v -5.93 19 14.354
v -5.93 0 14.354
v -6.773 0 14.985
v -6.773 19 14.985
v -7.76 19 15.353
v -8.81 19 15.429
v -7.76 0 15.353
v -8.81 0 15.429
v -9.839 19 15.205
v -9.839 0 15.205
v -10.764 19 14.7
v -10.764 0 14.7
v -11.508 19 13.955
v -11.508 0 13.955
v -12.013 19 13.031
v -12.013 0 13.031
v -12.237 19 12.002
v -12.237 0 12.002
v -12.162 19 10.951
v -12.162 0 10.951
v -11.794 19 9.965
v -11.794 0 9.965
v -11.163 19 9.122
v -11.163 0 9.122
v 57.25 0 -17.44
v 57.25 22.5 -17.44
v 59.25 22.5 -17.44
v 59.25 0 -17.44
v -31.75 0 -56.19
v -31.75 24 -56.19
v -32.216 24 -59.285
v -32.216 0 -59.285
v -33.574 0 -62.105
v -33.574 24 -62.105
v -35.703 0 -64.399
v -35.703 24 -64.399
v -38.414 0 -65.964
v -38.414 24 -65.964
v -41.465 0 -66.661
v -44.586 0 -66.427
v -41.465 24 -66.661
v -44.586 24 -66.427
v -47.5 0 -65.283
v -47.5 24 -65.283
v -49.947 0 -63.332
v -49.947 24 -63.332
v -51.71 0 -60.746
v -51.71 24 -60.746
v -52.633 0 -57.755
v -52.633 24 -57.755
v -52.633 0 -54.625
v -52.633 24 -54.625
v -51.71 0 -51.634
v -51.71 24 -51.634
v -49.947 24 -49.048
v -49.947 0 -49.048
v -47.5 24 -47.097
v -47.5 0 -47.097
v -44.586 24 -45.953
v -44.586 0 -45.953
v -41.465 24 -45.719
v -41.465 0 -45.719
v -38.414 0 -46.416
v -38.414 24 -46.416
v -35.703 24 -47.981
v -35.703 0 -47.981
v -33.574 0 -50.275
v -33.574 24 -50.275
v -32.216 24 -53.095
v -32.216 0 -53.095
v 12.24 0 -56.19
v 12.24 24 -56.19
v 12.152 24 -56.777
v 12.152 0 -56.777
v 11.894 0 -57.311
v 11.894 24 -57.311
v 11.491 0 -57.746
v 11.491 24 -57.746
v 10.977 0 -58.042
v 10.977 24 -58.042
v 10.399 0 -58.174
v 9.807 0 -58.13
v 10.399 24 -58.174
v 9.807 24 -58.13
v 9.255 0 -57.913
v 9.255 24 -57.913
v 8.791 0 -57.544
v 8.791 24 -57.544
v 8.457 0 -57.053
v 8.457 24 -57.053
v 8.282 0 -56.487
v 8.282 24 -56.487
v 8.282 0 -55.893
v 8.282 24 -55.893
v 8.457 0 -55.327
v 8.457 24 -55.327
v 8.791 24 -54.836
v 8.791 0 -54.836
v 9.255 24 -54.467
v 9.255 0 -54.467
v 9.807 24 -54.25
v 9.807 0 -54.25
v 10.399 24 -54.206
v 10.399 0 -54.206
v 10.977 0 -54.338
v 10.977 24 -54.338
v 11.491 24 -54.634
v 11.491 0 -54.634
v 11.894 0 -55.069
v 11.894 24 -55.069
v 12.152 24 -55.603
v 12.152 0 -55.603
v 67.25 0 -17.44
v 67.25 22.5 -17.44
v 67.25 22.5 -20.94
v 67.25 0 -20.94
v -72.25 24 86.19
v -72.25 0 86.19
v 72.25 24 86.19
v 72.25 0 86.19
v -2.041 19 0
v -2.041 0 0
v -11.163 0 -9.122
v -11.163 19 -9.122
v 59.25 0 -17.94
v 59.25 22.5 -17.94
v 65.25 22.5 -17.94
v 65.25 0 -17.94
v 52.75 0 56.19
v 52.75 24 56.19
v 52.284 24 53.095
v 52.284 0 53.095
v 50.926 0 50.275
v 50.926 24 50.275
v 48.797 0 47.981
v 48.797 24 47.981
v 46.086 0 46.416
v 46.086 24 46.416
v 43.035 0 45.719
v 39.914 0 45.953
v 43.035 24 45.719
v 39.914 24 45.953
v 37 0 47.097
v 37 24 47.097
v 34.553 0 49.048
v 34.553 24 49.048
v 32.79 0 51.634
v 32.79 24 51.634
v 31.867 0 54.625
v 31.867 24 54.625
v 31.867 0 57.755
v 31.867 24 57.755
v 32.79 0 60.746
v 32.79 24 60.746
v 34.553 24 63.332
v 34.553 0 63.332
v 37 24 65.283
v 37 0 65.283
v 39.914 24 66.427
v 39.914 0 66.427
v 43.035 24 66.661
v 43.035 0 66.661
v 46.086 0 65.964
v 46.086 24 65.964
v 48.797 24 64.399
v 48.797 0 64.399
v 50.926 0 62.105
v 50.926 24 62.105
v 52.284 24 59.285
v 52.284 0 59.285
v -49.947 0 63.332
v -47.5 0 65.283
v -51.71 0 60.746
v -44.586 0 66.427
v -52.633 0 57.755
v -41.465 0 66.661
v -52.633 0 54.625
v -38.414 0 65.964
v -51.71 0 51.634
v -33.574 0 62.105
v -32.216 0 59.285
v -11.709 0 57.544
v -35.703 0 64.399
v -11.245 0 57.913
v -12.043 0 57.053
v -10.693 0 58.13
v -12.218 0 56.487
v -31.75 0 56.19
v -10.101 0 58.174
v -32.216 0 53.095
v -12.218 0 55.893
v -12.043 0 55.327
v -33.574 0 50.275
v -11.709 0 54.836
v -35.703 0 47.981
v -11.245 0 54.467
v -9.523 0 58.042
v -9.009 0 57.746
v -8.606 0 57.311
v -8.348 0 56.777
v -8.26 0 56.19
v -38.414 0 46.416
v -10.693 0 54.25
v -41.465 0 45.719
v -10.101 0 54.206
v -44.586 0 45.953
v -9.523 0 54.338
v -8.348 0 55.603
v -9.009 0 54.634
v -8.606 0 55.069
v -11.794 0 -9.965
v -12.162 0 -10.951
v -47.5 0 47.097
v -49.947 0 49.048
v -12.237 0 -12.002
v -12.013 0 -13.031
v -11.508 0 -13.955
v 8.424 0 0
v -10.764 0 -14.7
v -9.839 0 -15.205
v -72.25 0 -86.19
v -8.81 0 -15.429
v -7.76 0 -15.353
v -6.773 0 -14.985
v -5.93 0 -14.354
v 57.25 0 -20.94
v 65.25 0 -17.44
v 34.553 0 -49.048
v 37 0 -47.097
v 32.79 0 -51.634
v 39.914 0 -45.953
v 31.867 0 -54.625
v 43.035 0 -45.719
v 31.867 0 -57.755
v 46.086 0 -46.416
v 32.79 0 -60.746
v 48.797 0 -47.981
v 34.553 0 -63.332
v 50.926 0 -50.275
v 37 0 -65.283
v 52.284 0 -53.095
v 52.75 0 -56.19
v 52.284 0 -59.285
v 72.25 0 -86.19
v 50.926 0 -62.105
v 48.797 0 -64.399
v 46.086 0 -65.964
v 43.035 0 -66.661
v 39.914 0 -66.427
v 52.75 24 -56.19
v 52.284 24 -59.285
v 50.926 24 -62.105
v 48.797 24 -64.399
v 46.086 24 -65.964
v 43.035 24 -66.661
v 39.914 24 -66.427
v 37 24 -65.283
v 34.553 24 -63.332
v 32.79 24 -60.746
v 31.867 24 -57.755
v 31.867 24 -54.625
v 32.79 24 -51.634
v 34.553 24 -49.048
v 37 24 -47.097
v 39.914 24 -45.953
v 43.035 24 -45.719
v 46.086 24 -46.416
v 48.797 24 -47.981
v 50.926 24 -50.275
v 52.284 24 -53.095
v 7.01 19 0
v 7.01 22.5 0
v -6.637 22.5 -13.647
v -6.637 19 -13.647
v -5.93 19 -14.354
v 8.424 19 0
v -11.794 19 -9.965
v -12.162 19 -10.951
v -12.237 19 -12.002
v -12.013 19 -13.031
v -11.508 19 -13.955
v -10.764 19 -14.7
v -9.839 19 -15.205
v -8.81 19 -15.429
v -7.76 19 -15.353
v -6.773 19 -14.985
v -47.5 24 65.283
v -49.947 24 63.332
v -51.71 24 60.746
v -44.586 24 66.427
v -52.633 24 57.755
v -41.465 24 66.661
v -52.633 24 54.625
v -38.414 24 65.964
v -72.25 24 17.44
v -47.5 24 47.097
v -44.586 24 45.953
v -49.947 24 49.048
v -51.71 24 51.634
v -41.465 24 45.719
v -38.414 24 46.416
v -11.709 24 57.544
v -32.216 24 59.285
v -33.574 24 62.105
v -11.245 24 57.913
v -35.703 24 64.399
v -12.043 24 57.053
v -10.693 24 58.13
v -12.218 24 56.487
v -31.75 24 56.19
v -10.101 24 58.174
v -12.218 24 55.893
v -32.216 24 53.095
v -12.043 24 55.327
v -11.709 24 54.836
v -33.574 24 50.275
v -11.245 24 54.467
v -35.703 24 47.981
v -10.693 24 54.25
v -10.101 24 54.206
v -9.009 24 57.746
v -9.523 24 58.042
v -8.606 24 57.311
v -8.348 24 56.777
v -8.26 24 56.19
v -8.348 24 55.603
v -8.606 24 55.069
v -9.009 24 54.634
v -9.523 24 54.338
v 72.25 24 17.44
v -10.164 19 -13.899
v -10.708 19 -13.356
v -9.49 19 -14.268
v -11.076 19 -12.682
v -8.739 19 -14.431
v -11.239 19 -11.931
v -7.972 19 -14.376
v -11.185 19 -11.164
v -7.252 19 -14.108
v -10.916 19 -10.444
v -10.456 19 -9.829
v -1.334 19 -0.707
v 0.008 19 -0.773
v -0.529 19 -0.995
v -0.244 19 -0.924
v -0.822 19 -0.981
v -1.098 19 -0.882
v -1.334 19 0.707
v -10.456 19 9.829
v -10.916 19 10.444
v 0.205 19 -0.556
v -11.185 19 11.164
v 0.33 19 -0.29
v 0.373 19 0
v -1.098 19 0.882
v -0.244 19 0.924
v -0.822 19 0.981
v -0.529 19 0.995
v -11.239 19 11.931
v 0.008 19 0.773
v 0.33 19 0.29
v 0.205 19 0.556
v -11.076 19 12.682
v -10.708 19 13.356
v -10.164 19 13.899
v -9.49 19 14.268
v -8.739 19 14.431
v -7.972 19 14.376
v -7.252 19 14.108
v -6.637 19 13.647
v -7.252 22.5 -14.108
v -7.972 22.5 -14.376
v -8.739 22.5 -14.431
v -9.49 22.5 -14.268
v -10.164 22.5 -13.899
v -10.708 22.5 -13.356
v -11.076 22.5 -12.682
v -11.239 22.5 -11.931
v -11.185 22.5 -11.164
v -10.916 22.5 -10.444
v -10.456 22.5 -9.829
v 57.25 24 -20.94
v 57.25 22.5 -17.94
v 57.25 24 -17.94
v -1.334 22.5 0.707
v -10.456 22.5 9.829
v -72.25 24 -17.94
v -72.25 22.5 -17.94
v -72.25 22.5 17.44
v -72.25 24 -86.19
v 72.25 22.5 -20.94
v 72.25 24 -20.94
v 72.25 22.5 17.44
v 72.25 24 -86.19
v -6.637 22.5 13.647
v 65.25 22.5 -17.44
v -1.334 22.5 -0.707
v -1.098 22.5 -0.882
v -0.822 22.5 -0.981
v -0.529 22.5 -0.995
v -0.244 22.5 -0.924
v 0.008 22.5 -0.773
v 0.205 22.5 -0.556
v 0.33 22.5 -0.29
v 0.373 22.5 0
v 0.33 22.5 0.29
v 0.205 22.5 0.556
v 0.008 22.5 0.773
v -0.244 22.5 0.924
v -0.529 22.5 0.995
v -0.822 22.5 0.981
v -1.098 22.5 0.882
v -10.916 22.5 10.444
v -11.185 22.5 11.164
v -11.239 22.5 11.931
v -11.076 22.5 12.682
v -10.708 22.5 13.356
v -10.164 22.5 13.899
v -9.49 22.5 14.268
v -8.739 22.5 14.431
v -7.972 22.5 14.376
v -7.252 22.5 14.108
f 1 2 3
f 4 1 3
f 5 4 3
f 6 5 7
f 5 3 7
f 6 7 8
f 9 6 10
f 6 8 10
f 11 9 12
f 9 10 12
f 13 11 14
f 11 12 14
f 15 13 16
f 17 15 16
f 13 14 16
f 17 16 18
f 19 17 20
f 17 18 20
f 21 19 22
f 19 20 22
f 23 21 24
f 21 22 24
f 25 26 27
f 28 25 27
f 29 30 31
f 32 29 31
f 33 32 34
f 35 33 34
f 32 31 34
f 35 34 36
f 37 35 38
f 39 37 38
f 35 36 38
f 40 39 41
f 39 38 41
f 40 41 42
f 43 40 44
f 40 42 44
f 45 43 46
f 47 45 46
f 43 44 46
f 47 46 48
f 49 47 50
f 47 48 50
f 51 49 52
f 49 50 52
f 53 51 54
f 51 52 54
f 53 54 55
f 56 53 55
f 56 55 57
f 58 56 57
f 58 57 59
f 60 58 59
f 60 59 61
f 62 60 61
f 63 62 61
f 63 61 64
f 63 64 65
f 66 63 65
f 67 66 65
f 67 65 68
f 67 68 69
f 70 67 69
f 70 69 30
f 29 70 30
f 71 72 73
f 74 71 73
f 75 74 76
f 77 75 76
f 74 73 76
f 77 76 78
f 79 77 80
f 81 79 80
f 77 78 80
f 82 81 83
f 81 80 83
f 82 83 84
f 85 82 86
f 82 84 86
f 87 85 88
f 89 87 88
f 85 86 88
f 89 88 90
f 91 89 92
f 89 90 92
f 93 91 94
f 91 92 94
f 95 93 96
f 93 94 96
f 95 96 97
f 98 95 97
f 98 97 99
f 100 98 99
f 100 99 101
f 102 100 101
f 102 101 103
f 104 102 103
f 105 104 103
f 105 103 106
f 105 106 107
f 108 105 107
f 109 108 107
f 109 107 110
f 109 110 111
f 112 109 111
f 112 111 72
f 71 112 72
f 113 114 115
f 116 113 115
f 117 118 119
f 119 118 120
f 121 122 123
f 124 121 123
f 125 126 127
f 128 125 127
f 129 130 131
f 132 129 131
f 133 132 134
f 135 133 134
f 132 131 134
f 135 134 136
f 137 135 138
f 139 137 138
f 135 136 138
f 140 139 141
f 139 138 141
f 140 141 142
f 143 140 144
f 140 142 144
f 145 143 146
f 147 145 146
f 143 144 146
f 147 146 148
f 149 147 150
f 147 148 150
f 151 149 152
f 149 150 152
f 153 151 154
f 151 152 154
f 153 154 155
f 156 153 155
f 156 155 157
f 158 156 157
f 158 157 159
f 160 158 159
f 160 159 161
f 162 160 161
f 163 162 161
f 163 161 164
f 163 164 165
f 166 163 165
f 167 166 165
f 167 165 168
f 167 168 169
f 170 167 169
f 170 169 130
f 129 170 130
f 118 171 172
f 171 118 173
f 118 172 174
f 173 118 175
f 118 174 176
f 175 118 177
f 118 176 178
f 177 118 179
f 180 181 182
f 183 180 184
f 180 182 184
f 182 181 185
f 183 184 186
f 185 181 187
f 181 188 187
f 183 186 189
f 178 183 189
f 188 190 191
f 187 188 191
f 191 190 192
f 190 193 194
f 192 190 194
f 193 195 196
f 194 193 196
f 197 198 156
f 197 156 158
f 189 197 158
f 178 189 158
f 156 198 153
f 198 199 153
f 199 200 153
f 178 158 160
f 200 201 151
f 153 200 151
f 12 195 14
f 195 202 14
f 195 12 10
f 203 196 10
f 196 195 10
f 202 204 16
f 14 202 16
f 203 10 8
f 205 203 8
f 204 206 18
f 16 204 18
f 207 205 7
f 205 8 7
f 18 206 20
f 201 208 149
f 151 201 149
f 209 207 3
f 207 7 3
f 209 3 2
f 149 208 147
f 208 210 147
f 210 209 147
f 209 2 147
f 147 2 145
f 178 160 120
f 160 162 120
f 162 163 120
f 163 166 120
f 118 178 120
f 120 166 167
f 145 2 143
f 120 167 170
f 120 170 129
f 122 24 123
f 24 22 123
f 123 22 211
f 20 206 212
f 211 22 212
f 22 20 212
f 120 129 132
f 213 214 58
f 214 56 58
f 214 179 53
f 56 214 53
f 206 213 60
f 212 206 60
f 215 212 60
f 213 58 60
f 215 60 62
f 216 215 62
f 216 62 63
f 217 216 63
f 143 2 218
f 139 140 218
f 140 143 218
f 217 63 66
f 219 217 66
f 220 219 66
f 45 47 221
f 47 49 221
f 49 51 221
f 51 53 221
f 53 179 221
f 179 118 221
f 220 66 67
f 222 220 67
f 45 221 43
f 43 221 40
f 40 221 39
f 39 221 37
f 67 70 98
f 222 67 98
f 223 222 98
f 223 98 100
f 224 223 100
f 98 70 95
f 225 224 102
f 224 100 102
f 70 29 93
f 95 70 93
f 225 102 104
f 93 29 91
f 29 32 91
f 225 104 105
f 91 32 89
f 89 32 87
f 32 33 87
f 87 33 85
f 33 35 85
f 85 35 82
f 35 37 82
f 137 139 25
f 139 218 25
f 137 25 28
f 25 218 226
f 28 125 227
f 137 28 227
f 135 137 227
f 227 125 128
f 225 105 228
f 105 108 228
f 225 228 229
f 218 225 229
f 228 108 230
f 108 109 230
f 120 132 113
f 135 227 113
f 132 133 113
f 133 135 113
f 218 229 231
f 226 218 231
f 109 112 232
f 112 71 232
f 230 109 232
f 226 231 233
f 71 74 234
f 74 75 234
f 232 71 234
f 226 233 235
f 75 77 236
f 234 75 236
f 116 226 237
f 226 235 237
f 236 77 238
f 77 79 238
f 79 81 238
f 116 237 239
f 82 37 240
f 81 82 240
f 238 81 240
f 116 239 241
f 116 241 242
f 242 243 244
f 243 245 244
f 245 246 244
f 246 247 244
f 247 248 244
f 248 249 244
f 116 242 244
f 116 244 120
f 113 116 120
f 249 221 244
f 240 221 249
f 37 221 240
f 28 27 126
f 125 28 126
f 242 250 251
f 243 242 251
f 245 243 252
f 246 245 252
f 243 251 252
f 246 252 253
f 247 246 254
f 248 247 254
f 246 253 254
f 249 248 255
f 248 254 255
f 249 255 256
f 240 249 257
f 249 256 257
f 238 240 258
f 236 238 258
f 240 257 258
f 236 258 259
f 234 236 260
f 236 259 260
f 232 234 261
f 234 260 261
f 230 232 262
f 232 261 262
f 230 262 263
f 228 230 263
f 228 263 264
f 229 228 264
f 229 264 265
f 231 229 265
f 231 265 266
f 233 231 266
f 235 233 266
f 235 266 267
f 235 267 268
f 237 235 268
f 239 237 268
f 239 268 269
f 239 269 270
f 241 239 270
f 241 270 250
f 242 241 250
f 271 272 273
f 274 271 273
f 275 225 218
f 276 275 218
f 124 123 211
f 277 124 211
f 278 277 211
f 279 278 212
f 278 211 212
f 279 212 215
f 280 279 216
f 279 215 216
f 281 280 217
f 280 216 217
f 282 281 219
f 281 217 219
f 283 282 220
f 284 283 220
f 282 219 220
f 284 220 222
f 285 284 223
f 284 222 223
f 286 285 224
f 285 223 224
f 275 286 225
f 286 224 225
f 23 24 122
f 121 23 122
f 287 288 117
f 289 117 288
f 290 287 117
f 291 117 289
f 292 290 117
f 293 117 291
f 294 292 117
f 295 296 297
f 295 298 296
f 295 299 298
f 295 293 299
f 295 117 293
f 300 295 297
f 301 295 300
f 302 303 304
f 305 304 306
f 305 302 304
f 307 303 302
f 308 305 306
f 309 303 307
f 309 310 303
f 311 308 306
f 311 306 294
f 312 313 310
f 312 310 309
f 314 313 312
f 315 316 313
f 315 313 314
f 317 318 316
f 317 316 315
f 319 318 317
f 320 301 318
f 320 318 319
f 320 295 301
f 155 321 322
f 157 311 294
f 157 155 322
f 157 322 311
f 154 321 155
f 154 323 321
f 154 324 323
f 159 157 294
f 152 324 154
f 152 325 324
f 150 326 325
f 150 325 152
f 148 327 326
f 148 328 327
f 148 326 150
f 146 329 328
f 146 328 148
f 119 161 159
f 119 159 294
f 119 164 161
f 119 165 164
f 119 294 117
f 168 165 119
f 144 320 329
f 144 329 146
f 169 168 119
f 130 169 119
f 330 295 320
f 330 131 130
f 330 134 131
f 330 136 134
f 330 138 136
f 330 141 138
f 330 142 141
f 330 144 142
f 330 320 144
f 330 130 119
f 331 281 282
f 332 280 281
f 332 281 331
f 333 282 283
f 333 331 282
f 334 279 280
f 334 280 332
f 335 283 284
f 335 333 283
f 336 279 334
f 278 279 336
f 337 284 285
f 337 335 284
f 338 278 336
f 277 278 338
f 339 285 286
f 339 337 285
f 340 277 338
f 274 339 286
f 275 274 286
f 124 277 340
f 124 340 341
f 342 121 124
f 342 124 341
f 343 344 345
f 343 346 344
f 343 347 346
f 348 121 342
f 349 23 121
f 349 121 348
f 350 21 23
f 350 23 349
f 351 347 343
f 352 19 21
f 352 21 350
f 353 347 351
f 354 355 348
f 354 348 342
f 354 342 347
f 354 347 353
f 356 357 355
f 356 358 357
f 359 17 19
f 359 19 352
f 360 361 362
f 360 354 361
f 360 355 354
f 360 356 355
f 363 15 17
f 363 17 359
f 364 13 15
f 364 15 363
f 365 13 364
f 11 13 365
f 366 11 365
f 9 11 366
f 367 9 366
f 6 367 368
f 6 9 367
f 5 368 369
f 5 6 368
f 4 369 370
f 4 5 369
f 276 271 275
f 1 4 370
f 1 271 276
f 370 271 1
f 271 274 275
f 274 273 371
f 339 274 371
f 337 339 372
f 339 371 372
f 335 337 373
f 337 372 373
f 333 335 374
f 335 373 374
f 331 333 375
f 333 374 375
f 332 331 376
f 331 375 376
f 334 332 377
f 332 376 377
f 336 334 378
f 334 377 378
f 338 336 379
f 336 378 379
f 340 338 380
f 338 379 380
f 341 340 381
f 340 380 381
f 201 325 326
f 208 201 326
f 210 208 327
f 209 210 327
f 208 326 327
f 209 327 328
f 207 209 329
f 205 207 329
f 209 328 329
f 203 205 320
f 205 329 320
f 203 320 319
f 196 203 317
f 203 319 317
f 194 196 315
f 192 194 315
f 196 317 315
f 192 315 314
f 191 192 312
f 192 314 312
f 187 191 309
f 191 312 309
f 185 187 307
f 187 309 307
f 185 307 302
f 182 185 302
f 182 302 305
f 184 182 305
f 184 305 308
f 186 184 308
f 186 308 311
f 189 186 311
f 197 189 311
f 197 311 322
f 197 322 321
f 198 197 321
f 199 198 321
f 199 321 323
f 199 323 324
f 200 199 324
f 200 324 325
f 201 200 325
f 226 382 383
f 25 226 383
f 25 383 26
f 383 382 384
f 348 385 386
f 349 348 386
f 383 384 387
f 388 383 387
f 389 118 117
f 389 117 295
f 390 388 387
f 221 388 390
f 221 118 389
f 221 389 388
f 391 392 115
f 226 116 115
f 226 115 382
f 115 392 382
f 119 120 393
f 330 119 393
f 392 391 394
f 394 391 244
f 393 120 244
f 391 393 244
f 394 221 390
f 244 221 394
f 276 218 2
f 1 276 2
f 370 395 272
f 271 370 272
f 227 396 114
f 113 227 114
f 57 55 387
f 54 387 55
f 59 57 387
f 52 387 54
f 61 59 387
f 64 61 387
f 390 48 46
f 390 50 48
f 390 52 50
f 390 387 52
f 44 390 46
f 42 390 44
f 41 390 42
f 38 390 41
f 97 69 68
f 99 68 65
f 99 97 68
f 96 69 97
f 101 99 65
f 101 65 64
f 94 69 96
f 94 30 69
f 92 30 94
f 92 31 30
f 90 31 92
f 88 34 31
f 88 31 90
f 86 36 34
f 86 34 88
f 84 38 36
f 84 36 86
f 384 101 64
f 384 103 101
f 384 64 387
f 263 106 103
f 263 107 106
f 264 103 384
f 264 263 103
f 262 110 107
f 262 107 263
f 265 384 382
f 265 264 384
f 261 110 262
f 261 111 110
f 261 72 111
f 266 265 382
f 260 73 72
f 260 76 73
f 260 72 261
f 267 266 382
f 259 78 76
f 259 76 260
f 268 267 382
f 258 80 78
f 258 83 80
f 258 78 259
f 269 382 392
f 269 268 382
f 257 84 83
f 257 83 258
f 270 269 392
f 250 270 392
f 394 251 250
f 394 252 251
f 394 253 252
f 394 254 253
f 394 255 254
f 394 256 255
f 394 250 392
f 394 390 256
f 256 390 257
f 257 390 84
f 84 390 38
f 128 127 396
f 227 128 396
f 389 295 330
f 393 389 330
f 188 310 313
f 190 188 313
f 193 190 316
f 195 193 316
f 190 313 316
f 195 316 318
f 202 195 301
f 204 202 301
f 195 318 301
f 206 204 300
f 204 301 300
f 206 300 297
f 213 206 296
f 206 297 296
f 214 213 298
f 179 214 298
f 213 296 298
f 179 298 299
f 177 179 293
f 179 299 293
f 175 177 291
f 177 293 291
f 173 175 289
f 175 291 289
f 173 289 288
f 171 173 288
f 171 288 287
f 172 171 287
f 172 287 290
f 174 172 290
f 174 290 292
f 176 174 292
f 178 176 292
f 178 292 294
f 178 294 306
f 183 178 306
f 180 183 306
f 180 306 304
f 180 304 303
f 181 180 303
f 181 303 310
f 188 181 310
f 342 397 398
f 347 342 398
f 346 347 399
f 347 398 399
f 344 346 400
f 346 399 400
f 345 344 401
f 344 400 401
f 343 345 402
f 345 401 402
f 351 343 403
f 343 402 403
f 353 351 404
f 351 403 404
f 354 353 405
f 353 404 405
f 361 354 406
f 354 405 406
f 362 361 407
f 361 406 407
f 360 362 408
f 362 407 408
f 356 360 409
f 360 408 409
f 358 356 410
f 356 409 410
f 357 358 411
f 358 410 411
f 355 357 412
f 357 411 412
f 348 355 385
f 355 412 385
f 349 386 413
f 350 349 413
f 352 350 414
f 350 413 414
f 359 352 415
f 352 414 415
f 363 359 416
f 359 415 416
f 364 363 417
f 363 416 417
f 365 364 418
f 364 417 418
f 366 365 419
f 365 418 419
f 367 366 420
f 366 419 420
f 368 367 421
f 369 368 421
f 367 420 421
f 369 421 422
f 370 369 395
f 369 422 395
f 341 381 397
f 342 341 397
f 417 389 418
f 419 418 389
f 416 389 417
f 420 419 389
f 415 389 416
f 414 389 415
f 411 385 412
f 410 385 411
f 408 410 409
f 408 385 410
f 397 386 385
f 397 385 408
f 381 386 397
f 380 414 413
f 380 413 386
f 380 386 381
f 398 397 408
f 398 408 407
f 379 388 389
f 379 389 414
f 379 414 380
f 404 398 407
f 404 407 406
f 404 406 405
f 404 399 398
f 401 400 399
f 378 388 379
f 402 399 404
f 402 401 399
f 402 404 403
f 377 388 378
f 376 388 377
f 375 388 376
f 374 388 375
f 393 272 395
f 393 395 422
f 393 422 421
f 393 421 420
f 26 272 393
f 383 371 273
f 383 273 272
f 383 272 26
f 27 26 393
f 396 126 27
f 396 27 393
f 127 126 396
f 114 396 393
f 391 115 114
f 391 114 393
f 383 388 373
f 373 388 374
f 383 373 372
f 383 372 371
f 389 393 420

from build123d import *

# Parameters (mm, degrees)
SKETCH2_W           = 144.5
SKETCH2_H           = 172.38
BOSS_EXTRUDE1_DEPTH = 24
SKETCH3_R           = 10.5
SKETCH3_R_2         = 1.99
CUT_EXTRUDE2_DEPTH  = 25
CUT_EXTRUDE3_DEPTH  = 1.5
CUT_EXTRUDE4_DEPTH  = 19


with BuildPart() as part:
    # Sketch2 → Boss-Extrude1 (new body)
    with BuildSketch(Plane(origin=(0, 0, 0), x_dir=(1, 0, 0), z_dir=(0, 1, 0))):
        Rectangle(SKETCH2_W, SKETCH2_H)
    extrude(amount=BOSS_EXTRUDE1_DEPTH)

    # Sketch3 → Cut-Extrude2 (cut, through all)
    with BuildSketch(Plane(origin=(0, 24, 0), x_dir=(1, 0, 0), z_dir=(0, 1, 0))):
        with Locations((42.25, 56.19)):
            Circle(SKETCH3_R)
        with Locations((-42.25, 56.19)):
            Circle(SKETCH3_R)
        with Locations((-42.25, -56.19)):
            Circle(SKETCH3_R)
        with Locations((42.25, -56.19)):
            Circle(SKETCH3_R)
        with Locations((10.25, 56.19)):
            Circle(SKETCH3_R_2)
        with Locations((-10.25, -56.19)):
            Circle(SKETCH3_R_2)
        Polygon((57.25, 17.44), (59.25, 17.44), (59.25, 17.94), (65.25, 17.94), (65.25, 17.44), (67.25, 17.44), (67.25, 20.94), (57.25, 20.94), align=None)
        with BuildLine():
            Line((-10.455537495, 9.828784258), (-1.333860018, 0.707106781))
            ThreePointArc((-1.333860018, 0.707106781), (0.373246763, 0), (-1.333860018, -0.707106781))
            Line((-1.333860018, -0.707106781), (-10.455537495, -9.828784258))
            ThreePointArc((-10.455537495, -9.828784258), (-10.455537495, -13.647160877), (-6.637160877, -13.647160877))
            Line((-6.637160877, -13.647160877), (7.01, 0))
            Line((7.01, 0), (-6.637160877, 13.647160877))
            ThreePointArc((-6.637160877, 13.647160877), (-10.455537495, 13.647160877), (-10.455537495, 9.828784258))
        make_face()
    extrude(amount=-CUT_EXTRUDE2_DEPTH, mode=Mode.SUBTRACT)

    # Sketch5 → Cut-Extrude3 (cut)
    with BuildSketch(Plane(origin=(0, 24, 0), x_dir=(1, 0, 0), z_dir=(0, 1, 0))):
        Polygon((57.25, 17.94), (-72.25, 17.94), (-72.25, -17.44), (72.25, -17.44), (72.25, 20.94), (67.25, 20.94), (67.25, 17.44), (65.25, 17.44), (65.25, 17.94), (59.25, 17.94), (59.25, 17.44), (57.25, 17.44), align=None)
        with BuildLine():
            ThreePointArc((-1.333860018, -0.707106781), (0.373246763, 0), (-1.333860018, 0.707106781))
            Line((-1.333860018, 0.707106781), (-10.455537495, 9.828784258))
            ThreePointArc((-10.455537495, 9.828784258), (-10.455537495, 13.647160877), (-6.637160877, 13.647160877))
            Line((-6.637160877, 13.647160877), (7.01, 0))
            Line((7.01, 0), (-6.637160877, -13.647160877))
            ThreePointArc((-6.637160877, -13.647160877), (-10.455537495, -13.647160877), (-10.455537495, -9.828784258))
            Line((-10.455537495, -9.828784258), (-1.333860018, -0.707106781))
        make_face(mode=Mode.SUBTRACT)
    extrude(amount=-CUT_EXTRUDE3_DEPTH, mode=Mode.SUBTRACT)

    # Sketch7 → Cut-Extrude4 (cut)
    with BuildSketch(Plane.XZ):
        with BuildLine():
            Line((-2.040966799, 0), (-11.162644276, -9.121677477))
            ThreePointArc((-11.162644276, -9.121677477), (-11.162644276, -14.354267658), (-5.930054096, -14.354267658))
            Line((-5.930054096, -14.354267658), (8.424213562, 0))
            Line((8.424213562, 0), (-5.930054096, 14.354267658))
            ThreePointArc((-5.930054096, 14.354267658), (-11.162644276, 14.354267658), (-11.162644276, 9.121677477))
            Line((-11.162644276, 9.121677477), (-2.040966799, 0))
        make_face()
    extrude(amount=-CUT_EXTRUDE4_DEPTH, mode=Mode.SUBTRACT)


solid = part.part
